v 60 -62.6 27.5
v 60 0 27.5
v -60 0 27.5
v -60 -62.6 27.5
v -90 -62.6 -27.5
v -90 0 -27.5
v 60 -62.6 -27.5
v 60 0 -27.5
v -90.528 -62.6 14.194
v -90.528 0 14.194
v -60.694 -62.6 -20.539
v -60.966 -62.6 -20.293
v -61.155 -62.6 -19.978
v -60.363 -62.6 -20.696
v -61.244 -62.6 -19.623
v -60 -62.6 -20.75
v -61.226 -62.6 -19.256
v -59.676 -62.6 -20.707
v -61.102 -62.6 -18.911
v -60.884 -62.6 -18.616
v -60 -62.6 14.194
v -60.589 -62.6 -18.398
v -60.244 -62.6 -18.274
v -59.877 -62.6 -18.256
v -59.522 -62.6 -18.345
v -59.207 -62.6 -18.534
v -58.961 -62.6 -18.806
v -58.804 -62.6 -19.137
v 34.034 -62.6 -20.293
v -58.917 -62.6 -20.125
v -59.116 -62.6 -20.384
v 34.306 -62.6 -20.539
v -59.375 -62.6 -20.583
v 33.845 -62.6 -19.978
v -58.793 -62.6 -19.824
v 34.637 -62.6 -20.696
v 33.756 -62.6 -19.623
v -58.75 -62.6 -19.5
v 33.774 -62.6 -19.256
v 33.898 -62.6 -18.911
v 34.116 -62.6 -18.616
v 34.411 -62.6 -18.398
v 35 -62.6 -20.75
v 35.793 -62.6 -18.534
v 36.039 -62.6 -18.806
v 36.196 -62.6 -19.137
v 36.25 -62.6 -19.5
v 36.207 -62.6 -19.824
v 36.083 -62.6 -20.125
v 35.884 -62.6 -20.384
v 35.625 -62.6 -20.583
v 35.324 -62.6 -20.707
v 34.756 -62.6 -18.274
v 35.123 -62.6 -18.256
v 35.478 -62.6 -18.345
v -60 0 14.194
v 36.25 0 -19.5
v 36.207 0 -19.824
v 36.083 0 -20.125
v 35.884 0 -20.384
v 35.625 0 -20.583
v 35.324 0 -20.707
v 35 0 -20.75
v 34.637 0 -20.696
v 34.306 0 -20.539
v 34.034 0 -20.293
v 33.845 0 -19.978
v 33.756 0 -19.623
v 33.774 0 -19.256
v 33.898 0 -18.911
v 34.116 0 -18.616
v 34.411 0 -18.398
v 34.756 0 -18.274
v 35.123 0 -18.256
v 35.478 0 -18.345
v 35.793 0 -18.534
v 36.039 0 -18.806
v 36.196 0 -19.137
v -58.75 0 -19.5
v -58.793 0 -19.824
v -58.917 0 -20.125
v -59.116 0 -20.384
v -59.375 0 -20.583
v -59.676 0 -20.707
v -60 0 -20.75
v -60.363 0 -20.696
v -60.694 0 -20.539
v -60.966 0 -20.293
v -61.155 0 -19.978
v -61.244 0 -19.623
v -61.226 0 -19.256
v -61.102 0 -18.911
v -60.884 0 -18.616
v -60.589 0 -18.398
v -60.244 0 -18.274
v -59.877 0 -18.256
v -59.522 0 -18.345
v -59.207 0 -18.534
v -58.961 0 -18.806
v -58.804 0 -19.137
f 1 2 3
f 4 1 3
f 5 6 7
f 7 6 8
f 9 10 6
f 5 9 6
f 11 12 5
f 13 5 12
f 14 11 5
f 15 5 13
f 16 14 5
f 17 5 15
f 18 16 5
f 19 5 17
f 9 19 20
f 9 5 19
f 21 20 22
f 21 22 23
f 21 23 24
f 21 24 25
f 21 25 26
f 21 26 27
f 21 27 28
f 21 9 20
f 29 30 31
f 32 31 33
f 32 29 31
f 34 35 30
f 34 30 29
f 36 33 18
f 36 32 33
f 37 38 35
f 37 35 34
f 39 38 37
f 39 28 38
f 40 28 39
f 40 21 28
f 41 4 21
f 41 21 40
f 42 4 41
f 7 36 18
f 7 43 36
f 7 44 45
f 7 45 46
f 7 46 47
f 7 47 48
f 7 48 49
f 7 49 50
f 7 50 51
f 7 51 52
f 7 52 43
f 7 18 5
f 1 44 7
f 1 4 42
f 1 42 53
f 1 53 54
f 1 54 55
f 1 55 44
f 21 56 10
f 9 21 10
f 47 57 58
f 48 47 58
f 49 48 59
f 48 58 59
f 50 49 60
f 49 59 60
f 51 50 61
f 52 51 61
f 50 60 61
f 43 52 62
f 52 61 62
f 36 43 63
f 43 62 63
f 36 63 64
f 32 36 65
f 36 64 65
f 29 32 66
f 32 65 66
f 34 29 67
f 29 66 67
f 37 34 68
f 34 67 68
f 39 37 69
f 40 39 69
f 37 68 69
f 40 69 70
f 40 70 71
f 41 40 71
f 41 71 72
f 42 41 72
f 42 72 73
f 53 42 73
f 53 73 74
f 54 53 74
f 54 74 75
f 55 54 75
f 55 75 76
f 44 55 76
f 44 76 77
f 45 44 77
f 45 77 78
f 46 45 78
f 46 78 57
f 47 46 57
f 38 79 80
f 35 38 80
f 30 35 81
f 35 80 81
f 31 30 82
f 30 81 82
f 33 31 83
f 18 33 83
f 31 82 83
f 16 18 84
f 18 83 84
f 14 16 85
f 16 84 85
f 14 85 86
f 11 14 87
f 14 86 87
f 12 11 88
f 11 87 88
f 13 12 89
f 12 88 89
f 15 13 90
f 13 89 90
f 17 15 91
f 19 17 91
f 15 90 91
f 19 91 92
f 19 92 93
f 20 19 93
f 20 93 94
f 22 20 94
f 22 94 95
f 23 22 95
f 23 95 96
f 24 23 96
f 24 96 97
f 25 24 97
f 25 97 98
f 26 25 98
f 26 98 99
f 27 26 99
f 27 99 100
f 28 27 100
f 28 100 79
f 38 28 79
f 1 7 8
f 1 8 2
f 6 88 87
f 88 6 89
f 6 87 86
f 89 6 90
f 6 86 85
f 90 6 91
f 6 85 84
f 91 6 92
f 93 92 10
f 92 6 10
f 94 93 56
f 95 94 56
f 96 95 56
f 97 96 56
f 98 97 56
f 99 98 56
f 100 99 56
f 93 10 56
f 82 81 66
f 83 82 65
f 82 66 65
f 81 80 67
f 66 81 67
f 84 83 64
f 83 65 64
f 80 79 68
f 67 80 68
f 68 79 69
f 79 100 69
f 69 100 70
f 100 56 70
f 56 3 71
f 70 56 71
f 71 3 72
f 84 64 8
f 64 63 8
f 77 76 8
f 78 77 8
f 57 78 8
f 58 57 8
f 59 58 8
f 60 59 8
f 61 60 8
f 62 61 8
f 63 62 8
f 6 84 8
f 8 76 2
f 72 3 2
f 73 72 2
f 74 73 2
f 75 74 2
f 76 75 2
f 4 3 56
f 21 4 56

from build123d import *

# Parameters (mm, degrees)
F1_DEPTH = 25
F2_DEPTH = 37.6
F3_DEPTH = 25
F4_DEPTH = 25
F5_DEPTH = 25


with BuildPart() as f1:
    # F0 (on Front) → F1 (new body)
    with BuildSketch(Plane.XZ):
        Polygon((60, -27.5), (60, 27.5), (-60, 27.5), (-60, 14.1944857314), (-90.527780354, 14.1944857314), (-90, -27.5), (-60, -27.5), (35, -27.5), align=None)
        with BuildLine():
            ThreePointArc((-58.75, -19.5), (-59.1161165235, -20.3838834765), (-60, -20.75))
            ThreePointArc((-60, -20.75), (-60.8838834765, -18.6161165235), (-58.75, -19.5))
        make_face(mode=Mode.SUBTRACT)
        with BuildLine():
            ThreePointArc((36.25, -19.5), (35.8838834765, -20.3838834765), (35, -20.75))
            ThreePointArc((35, -20.75), (34.1161165235, -18.6161165235), (36.25, -19.5))
        make_face(mode=Mode.SUBTRACT)
    extrude(amount=F1_DEPTH)

    # F0 (on Front) → F2 (join)
    with BuildSketch(Plane.XZ):
        Polygon((60, -27.5), (60, 27.5), (-60, 27.5), (-60, 14.1944857314), (-90.527780354, 14.1944857314), (-90, -27.5), (-60, -27.5), (35, -27.5), align=None)
        with BuildLine():
            ThreePointArc((-58.75, -19.5), (-59.1161165235, -20.3838834765), (-60, -20.75))
            ThreePointArc((-60, -20.75), (-60.8838834765, -18.6161165235), (-58.75, -19.5))
        make_face(mode=Mode.SUBTRACT)
        with BuildLine():
            ThreePointArc((36.25, -19.5), (35.8838834765, -20.3838834765), (35, -20.75))
            ThreePointArc((35, -20.75), (34.1161165235, -18.6161165235), (36.25, -19.5))
        make_face(mode=Mode.SUBTRACT)
    extrude(amount=F2_DEPTH)

    # F0 (on Front) → F3 (join)
    with BuildSketch(Plane.XZ):
        Polygon((60, -27.5), (60, 27.5), (-60, 27.5), (-60, 14.1944857314), (-90.527780354, 14.1944857314), (-90, -27.5), (-60, -27.5), (35, -27.5), align=None)
        with BuildLine():
            ThreePointArc((-58.75, -19.5), (-59.1161165235, -20.3838834765), (-60, -20.75))
            ThreePointArc((-60, -20.75), (-60.8838834765, -18.6161165235), (-58.75, -19.5))
        make_face(mode=Mode.SUBTRACT)
        with BuildLine():
            ThreePointArc((36.25, -19.5), (35.8838834765, -20.3838834765), (35, -20.75))
            ThreePointArc((35, -20.75), (34.1161165235, -18.6161165235), (36.25, -19.5))
        make_face(mode=Mode.SUBTRACT)
    extrude(amount=F3_DEPTH)

    # F4 (add): a face of the model
    f4_faces = [f1.faces().sort_by_distance(p)[0] for p in [
        (-12.0583061009, -37.6, -1.0349945088),
    ]]
    extrude(f4_faces, amount=F4_DEPTH)

    # F0 (on Front) → F5 (join)
    with BuildSketch(Plane.XZ):
        Polygon((60, -27.5), (60, 27.5), (-60, 27.5), (-60, 14.1944857314), (-90.527780354, 14.1944857314), (-90, -27.5), (-60, -27.5), (35, -27.5), align=None)
        with BuildLine():
            ThreePointArc((-58.75, -19.5), (-59.1161165235, -20.3838834765), (-60, -20.75))
            ThreePointArc((-60, -20.75), (-60.8838834765, -18.6161165235), (-58.75, -19.5))
        make_face(mode=Mode.SUBTRACT)
        with BuildLine():
            ThreePointArc((36.25, -19.5), (35.8838834765, -20.3838834765), (35, -20.75))
            ThreePointArc((35, -20.75), (34.1161165235, -18.6161165235), (36.25, -19.5))
        make_face(mode=Mode.SUBTRACT)
    extrude(amount=F5_DEPTH)


solid = f1.part
